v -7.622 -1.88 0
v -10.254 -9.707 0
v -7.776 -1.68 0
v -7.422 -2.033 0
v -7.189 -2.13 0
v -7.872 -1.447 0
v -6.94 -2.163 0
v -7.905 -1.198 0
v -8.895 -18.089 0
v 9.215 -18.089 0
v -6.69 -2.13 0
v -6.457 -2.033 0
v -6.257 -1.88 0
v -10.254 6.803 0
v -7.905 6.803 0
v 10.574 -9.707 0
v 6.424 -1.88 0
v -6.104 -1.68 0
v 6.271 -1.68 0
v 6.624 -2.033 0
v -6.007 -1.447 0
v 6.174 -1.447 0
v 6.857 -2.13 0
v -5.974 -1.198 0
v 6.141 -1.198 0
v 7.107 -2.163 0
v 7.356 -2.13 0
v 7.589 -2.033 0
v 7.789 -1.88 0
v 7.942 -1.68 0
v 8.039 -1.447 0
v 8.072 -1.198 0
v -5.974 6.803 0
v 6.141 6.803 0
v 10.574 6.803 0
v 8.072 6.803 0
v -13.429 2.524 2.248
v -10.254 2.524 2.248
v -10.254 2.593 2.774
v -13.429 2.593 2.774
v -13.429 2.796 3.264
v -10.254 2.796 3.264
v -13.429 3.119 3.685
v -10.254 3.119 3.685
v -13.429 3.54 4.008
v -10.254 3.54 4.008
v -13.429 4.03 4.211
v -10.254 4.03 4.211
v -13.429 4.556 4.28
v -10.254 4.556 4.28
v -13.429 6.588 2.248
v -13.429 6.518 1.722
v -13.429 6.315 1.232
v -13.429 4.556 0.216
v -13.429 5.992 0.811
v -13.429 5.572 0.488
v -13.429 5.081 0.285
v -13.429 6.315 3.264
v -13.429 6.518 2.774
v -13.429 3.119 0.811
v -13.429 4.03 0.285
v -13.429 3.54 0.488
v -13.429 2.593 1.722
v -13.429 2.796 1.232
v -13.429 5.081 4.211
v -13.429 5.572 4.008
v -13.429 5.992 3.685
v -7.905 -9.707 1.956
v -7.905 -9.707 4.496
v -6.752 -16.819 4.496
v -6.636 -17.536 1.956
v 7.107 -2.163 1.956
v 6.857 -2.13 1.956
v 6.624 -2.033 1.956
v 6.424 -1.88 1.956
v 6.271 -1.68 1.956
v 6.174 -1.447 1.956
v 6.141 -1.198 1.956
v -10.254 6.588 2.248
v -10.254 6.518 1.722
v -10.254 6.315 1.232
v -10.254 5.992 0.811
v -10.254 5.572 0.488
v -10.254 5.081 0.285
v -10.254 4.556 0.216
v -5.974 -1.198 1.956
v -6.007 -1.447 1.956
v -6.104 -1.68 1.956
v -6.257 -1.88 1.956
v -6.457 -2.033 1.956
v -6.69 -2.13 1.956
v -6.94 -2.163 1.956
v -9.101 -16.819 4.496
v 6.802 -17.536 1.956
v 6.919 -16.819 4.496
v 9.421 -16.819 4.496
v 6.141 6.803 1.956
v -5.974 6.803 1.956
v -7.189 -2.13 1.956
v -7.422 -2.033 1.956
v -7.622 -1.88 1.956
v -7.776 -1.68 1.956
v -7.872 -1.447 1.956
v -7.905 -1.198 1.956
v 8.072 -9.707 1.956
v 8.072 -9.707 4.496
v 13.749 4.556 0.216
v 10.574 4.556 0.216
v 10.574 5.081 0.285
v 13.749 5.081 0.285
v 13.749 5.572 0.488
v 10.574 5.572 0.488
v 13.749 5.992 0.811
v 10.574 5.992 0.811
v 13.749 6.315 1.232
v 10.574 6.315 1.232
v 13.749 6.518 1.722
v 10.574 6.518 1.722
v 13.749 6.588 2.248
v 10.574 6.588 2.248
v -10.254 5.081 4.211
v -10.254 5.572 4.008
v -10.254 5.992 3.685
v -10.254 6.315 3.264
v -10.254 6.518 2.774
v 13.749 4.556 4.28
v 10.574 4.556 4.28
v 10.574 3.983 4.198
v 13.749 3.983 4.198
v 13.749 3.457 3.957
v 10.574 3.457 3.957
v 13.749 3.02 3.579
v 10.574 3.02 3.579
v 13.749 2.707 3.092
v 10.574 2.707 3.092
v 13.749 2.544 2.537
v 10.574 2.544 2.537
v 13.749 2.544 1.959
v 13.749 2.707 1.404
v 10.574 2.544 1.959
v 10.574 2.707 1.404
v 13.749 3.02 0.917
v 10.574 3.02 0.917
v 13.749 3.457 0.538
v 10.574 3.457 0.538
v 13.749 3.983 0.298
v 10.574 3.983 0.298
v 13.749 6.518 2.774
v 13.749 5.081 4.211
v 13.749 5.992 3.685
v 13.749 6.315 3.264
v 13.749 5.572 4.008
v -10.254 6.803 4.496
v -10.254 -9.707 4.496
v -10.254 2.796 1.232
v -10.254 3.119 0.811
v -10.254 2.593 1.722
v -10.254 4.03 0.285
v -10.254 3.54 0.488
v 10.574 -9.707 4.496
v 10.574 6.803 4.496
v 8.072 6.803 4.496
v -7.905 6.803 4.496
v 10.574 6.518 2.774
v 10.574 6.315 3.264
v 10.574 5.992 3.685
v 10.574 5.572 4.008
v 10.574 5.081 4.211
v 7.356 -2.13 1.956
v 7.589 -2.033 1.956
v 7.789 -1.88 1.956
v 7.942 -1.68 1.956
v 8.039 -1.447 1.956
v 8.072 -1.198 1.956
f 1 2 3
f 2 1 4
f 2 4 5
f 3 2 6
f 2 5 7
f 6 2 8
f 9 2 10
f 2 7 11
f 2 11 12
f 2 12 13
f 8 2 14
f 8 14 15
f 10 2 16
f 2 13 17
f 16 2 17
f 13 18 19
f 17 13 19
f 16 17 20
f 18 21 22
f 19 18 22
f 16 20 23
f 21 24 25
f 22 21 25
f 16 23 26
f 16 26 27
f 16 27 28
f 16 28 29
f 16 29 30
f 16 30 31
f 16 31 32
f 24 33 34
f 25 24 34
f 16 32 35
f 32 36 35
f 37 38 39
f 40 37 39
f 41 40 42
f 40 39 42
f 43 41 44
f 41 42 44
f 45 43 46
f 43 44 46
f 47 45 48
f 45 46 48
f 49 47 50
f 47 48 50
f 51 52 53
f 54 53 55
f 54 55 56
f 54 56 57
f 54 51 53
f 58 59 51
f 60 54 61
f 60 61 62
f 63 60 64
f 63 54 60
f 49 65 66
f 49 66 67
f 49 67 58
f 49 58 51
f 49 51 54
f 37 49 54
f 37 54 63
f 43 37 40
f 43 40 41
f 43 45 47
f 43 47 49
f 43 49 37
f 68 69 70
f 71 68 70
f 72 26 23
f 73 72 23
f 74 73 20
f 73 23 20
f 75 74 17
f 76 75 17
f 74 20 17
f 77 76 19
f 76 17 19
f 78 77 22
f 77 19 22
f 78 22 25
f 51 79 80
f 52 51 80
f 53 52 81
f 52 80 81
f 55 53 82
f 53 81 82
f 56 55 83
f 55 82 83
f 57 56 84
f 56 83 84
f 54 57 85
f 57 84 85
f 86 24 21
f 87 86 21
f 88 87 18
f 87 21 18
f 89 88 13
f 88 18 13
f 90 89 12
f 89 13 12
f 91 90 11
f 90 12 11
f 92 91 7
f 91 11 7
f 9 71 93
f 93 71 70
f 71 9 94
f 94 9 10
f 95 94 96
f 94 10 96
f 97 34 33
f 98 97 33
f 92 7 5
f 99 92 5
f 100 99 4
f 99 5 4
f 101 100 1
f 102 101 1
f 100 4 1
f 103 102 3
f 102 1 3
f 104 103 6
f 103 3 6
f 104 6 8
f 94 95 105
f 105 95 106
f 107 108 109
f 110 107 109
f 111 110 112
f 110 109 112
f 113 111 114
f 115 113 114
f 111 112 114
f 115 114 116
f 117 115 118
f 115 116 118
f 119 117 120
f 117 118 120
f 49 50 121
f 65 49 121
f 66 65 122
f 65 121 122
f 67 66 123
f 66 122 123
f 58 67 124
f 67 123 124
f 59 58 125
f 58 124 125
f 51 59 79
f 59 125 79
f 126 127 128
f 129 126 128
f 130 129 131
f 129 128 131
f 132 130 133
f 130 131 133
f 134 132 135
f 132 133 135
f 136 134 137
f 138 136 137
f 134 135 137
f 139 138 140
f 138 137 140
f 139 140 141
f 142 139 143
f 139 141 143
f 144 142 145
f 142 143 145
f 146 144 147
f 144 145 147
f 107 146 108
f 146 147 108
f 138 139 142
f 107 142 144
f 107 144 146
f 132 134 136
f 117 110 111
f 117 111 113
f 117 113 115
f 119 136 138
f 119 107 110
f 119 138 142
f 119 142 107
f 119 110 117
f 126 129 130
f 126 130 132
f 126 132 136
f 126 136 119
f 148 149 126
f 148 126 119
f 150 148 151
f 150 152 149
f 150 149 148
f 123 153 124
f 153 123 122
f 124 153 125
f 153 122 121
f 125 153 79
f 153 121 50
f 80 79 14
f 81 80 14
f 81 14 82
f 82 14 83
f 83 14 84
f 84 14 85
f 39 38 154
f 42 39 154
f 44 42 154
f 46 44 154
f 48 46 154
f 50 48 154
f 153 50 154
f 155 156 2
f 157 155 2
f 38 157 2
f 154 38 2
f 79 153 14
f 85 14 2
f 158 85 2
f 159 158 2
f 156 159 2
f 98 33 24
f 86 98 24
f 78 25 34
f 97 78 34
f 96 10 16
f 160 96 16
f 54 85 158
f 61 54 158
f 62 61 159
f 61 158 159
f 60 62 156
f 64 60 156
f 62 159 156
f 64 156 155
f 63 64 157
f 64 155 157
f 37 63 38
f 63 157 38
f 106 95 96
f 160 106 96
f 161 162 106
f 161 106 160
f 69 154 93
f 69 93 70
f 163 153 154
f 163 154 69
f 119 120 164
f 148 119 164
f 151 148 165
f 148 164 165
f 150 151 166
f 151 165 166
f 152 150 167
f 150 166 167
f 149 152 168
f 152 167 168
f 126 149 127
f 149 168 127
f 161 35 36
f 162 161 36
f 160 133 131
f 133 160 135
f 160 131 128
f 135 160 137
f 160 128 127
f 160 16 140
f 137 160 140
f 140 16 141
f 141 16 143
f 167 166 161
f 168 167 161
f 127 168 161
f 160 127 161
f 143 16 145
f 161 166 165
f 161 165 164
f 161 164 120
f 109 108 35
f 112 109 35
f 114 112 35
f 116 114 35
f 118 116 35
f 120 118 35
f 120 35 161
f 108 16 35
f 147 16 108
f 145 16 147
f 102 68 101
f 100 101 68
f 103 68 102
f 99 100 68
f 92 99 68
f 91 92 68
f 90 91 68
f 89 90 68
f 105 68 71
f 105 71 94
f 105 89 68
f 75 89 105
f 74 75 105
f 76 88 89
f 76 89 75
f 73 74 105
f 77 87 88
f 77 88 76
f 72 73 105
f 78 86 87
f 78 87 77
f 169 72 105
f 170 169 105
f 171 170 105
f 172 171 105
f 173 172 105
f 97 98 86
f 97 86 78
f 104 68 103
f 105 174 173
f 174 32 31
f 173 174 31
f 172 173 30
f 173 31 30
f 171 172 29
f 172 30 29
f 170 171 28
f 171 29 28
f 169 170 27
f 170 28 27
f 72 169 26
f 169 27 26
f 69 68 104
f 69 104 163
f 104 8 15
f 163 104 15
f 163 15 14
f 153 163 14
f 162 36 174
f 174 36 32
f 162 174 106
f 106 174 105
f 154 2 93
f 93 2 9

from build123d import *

# Parameters (mm, degrees)
F1_DEPTH = 4.4958
F3_DEPTH = 3.175
F5_DEPTH = 3.175
F7_DEPTH = 2.54
F9_DEPTH = 24.004


with BuildPart() as f1:
    # F0 (on Top) → F1 (new body)
    with BuildSketch(Plane.XY):
        with BuildLine():
            Line((-10.254373, 5.965228), (-10.254373, -0.308572))
            Line((-10.254373, -0.308572), (-10.254373, -9.70656))
            Line((-10.254373, -9.70656), (-8.895473, -18.088572))
            Line((-8.895473, -18.088572), (9.214727, -18.088572))
            Line((9.214727, -18.088572), (10.573627, -9.70656))
            Line((10.573627, -9.70656), (10.573627, -0.308572))
            Line((10.573627, -0.308572), (10.573627, 5.965228))
            Line((10.573627, 5.965228), (10.573627, 6.803428))
            Line((10.573627, 6.803428), (8.071727, 6.803428))
            Line((8.071727, 6.803428), (8.071727, -1.197572))
            ThreePointArc((8.071727, -1.197572), (7.789027, -1.880072), (7.106527, -2.162772))
            ThreePointArc((7.106527, -2.162772), (6.424028, -1.880072), (6.141327, -1.197572))
            Line((6.141327, -1.197572), (6.141327, 6.803428))
            Line((6.141327, 6.803428), (-5.974473, 6.803428))
            Line((-5.974473, 6.803428), (-5.974473, -1.197572))
            ThreePointArc((-5.974473, -1.197572), (-6.257173, -1.880072), (-6.939673, -2.162772))
            ThreePointArc((-6.939673, -2.162772), (-7.622172, -1.880072), (-7.904873, -1.197572))
            Line((-7.904873, -1.197572), (-7.904873, 6.803428))
            Line((-7.904873, 6.803428), (-10.254373, 6.803428))
            Line((-10.254373, 6.803428), (-10.254373, 5.965228))
        make_face()
    extrude(amount=F1_DEPTH)

    # F2 (on face) → F3 (join)
    with BuildSketch(Plane.YZ.offset(10.573627)):
        with BuildLine():
            Line((4.555528, 2.2479), (4.555528, 4.2799))
            ThreePointArc((4.555528, 4.2799), (2.523528, 2.2479), (4.555528, 0.2159))
            Line((4.555528, 0.2159), (4.555528, 2.2479))
        make_face()
        with BuildLine():
            ThreePointArc((4.555528, 0.2159), (5.992369, 0.811059), (6.587528, 2.2479))
            ThreePointArc((6.587528, 2.2479), (5.992369, 3.684741), (4.555528, 4.2799))
            Line((4.555528, 4.2799), (4.555528, 2.2479))
            Line((4.555528, 2.2479), (4.555528, 0.2159))
        make_face()
    extrude(amount=F3_DEPTH)

    # F4 (on face) → F5 (join)
    with BuildSketch(Plane(origin=(-10.254373, 0, 0), x_dir=(0, -1, 0), z_dir=(-1, 0, 0))):
        with BuildLine():
            Line((-4.555528, 2.2479), (-4.555528, 4.2799))
            ThreePointArc((-4.555528, 4.2799), (-5.992369, 3.684741), (-6.587528, 2.2479))
            ThreePointArc((-6.587528, 2.2479), (-5.992369, 0.811059), (-4.555528, 0.2159))
            Line((-4.555528, 0.2159), (-4.555528, 2.2479))
        make_face()
        with BuildLine():
            ThreePointArc((-4.555528, 0.2159), (-3.118687, 0.811059), (-2.523528, 2.2479))
            ThreePointArc((-2.523528, 2.2479), (-3.118687, 3.684741), (-4.555528, 4.2799))
            Line((-4.555528, 4.2799), (-4.555528, 2.2479))
            Line((-4.555528, 2.2479), (-4.555528, 0.2159))
        make_face()
    extrude(amount=F5_DEPTH)

    # F6 (on face) → F7 (cut)
    with BuildSketch(Plane.XY.offset(4.4958)):
        with BuildLine():
            ThreePointArc((-5.974473, -1.197572), (-6.939673, -2.162772), (-7.904873, -1.197572))
            Line((-7.904873, -1.197572), (-7.904873, -9.70656))
            Line((-7.904873, -9.70656), (-6.545973, -18.088572))
            Line((-6.545973, -18.088572), (6.712827, -18.088572))
            Line((6.712827, -18.088572), (8.071727, -9.70656))
            Line((8.071727, -9.70656), (8.071727, -1.197572))
            ThreePointArc((8.071727, -1.197572), (7.106527, -2.162772), (6.141327, -1.197572))
            Line((6.141327, -1.197572), (6.141327, 6.803428))
            Line((6.141327, 6.803428), (-5.974473, 6.803428))
            Line((-5.974473, 6.803428), (-5.974473, -1.197572))
        make_face()
    extrude(amount=-F7_DEPTH, mode=Mode.SUBTRACT)

    # F8 (on face) → F9 (cut, through all)
    with BuildSketch(Plane.YZ.offset(10.573627)):
        Polygon((-18.088572, 4.4958), (-18.088572, 0), (-16.818572, 4.4958), align=None)
    extrude(amount=-F9_DEPTH, mode=Mode.SUBTRACT)


solid = f1.part
